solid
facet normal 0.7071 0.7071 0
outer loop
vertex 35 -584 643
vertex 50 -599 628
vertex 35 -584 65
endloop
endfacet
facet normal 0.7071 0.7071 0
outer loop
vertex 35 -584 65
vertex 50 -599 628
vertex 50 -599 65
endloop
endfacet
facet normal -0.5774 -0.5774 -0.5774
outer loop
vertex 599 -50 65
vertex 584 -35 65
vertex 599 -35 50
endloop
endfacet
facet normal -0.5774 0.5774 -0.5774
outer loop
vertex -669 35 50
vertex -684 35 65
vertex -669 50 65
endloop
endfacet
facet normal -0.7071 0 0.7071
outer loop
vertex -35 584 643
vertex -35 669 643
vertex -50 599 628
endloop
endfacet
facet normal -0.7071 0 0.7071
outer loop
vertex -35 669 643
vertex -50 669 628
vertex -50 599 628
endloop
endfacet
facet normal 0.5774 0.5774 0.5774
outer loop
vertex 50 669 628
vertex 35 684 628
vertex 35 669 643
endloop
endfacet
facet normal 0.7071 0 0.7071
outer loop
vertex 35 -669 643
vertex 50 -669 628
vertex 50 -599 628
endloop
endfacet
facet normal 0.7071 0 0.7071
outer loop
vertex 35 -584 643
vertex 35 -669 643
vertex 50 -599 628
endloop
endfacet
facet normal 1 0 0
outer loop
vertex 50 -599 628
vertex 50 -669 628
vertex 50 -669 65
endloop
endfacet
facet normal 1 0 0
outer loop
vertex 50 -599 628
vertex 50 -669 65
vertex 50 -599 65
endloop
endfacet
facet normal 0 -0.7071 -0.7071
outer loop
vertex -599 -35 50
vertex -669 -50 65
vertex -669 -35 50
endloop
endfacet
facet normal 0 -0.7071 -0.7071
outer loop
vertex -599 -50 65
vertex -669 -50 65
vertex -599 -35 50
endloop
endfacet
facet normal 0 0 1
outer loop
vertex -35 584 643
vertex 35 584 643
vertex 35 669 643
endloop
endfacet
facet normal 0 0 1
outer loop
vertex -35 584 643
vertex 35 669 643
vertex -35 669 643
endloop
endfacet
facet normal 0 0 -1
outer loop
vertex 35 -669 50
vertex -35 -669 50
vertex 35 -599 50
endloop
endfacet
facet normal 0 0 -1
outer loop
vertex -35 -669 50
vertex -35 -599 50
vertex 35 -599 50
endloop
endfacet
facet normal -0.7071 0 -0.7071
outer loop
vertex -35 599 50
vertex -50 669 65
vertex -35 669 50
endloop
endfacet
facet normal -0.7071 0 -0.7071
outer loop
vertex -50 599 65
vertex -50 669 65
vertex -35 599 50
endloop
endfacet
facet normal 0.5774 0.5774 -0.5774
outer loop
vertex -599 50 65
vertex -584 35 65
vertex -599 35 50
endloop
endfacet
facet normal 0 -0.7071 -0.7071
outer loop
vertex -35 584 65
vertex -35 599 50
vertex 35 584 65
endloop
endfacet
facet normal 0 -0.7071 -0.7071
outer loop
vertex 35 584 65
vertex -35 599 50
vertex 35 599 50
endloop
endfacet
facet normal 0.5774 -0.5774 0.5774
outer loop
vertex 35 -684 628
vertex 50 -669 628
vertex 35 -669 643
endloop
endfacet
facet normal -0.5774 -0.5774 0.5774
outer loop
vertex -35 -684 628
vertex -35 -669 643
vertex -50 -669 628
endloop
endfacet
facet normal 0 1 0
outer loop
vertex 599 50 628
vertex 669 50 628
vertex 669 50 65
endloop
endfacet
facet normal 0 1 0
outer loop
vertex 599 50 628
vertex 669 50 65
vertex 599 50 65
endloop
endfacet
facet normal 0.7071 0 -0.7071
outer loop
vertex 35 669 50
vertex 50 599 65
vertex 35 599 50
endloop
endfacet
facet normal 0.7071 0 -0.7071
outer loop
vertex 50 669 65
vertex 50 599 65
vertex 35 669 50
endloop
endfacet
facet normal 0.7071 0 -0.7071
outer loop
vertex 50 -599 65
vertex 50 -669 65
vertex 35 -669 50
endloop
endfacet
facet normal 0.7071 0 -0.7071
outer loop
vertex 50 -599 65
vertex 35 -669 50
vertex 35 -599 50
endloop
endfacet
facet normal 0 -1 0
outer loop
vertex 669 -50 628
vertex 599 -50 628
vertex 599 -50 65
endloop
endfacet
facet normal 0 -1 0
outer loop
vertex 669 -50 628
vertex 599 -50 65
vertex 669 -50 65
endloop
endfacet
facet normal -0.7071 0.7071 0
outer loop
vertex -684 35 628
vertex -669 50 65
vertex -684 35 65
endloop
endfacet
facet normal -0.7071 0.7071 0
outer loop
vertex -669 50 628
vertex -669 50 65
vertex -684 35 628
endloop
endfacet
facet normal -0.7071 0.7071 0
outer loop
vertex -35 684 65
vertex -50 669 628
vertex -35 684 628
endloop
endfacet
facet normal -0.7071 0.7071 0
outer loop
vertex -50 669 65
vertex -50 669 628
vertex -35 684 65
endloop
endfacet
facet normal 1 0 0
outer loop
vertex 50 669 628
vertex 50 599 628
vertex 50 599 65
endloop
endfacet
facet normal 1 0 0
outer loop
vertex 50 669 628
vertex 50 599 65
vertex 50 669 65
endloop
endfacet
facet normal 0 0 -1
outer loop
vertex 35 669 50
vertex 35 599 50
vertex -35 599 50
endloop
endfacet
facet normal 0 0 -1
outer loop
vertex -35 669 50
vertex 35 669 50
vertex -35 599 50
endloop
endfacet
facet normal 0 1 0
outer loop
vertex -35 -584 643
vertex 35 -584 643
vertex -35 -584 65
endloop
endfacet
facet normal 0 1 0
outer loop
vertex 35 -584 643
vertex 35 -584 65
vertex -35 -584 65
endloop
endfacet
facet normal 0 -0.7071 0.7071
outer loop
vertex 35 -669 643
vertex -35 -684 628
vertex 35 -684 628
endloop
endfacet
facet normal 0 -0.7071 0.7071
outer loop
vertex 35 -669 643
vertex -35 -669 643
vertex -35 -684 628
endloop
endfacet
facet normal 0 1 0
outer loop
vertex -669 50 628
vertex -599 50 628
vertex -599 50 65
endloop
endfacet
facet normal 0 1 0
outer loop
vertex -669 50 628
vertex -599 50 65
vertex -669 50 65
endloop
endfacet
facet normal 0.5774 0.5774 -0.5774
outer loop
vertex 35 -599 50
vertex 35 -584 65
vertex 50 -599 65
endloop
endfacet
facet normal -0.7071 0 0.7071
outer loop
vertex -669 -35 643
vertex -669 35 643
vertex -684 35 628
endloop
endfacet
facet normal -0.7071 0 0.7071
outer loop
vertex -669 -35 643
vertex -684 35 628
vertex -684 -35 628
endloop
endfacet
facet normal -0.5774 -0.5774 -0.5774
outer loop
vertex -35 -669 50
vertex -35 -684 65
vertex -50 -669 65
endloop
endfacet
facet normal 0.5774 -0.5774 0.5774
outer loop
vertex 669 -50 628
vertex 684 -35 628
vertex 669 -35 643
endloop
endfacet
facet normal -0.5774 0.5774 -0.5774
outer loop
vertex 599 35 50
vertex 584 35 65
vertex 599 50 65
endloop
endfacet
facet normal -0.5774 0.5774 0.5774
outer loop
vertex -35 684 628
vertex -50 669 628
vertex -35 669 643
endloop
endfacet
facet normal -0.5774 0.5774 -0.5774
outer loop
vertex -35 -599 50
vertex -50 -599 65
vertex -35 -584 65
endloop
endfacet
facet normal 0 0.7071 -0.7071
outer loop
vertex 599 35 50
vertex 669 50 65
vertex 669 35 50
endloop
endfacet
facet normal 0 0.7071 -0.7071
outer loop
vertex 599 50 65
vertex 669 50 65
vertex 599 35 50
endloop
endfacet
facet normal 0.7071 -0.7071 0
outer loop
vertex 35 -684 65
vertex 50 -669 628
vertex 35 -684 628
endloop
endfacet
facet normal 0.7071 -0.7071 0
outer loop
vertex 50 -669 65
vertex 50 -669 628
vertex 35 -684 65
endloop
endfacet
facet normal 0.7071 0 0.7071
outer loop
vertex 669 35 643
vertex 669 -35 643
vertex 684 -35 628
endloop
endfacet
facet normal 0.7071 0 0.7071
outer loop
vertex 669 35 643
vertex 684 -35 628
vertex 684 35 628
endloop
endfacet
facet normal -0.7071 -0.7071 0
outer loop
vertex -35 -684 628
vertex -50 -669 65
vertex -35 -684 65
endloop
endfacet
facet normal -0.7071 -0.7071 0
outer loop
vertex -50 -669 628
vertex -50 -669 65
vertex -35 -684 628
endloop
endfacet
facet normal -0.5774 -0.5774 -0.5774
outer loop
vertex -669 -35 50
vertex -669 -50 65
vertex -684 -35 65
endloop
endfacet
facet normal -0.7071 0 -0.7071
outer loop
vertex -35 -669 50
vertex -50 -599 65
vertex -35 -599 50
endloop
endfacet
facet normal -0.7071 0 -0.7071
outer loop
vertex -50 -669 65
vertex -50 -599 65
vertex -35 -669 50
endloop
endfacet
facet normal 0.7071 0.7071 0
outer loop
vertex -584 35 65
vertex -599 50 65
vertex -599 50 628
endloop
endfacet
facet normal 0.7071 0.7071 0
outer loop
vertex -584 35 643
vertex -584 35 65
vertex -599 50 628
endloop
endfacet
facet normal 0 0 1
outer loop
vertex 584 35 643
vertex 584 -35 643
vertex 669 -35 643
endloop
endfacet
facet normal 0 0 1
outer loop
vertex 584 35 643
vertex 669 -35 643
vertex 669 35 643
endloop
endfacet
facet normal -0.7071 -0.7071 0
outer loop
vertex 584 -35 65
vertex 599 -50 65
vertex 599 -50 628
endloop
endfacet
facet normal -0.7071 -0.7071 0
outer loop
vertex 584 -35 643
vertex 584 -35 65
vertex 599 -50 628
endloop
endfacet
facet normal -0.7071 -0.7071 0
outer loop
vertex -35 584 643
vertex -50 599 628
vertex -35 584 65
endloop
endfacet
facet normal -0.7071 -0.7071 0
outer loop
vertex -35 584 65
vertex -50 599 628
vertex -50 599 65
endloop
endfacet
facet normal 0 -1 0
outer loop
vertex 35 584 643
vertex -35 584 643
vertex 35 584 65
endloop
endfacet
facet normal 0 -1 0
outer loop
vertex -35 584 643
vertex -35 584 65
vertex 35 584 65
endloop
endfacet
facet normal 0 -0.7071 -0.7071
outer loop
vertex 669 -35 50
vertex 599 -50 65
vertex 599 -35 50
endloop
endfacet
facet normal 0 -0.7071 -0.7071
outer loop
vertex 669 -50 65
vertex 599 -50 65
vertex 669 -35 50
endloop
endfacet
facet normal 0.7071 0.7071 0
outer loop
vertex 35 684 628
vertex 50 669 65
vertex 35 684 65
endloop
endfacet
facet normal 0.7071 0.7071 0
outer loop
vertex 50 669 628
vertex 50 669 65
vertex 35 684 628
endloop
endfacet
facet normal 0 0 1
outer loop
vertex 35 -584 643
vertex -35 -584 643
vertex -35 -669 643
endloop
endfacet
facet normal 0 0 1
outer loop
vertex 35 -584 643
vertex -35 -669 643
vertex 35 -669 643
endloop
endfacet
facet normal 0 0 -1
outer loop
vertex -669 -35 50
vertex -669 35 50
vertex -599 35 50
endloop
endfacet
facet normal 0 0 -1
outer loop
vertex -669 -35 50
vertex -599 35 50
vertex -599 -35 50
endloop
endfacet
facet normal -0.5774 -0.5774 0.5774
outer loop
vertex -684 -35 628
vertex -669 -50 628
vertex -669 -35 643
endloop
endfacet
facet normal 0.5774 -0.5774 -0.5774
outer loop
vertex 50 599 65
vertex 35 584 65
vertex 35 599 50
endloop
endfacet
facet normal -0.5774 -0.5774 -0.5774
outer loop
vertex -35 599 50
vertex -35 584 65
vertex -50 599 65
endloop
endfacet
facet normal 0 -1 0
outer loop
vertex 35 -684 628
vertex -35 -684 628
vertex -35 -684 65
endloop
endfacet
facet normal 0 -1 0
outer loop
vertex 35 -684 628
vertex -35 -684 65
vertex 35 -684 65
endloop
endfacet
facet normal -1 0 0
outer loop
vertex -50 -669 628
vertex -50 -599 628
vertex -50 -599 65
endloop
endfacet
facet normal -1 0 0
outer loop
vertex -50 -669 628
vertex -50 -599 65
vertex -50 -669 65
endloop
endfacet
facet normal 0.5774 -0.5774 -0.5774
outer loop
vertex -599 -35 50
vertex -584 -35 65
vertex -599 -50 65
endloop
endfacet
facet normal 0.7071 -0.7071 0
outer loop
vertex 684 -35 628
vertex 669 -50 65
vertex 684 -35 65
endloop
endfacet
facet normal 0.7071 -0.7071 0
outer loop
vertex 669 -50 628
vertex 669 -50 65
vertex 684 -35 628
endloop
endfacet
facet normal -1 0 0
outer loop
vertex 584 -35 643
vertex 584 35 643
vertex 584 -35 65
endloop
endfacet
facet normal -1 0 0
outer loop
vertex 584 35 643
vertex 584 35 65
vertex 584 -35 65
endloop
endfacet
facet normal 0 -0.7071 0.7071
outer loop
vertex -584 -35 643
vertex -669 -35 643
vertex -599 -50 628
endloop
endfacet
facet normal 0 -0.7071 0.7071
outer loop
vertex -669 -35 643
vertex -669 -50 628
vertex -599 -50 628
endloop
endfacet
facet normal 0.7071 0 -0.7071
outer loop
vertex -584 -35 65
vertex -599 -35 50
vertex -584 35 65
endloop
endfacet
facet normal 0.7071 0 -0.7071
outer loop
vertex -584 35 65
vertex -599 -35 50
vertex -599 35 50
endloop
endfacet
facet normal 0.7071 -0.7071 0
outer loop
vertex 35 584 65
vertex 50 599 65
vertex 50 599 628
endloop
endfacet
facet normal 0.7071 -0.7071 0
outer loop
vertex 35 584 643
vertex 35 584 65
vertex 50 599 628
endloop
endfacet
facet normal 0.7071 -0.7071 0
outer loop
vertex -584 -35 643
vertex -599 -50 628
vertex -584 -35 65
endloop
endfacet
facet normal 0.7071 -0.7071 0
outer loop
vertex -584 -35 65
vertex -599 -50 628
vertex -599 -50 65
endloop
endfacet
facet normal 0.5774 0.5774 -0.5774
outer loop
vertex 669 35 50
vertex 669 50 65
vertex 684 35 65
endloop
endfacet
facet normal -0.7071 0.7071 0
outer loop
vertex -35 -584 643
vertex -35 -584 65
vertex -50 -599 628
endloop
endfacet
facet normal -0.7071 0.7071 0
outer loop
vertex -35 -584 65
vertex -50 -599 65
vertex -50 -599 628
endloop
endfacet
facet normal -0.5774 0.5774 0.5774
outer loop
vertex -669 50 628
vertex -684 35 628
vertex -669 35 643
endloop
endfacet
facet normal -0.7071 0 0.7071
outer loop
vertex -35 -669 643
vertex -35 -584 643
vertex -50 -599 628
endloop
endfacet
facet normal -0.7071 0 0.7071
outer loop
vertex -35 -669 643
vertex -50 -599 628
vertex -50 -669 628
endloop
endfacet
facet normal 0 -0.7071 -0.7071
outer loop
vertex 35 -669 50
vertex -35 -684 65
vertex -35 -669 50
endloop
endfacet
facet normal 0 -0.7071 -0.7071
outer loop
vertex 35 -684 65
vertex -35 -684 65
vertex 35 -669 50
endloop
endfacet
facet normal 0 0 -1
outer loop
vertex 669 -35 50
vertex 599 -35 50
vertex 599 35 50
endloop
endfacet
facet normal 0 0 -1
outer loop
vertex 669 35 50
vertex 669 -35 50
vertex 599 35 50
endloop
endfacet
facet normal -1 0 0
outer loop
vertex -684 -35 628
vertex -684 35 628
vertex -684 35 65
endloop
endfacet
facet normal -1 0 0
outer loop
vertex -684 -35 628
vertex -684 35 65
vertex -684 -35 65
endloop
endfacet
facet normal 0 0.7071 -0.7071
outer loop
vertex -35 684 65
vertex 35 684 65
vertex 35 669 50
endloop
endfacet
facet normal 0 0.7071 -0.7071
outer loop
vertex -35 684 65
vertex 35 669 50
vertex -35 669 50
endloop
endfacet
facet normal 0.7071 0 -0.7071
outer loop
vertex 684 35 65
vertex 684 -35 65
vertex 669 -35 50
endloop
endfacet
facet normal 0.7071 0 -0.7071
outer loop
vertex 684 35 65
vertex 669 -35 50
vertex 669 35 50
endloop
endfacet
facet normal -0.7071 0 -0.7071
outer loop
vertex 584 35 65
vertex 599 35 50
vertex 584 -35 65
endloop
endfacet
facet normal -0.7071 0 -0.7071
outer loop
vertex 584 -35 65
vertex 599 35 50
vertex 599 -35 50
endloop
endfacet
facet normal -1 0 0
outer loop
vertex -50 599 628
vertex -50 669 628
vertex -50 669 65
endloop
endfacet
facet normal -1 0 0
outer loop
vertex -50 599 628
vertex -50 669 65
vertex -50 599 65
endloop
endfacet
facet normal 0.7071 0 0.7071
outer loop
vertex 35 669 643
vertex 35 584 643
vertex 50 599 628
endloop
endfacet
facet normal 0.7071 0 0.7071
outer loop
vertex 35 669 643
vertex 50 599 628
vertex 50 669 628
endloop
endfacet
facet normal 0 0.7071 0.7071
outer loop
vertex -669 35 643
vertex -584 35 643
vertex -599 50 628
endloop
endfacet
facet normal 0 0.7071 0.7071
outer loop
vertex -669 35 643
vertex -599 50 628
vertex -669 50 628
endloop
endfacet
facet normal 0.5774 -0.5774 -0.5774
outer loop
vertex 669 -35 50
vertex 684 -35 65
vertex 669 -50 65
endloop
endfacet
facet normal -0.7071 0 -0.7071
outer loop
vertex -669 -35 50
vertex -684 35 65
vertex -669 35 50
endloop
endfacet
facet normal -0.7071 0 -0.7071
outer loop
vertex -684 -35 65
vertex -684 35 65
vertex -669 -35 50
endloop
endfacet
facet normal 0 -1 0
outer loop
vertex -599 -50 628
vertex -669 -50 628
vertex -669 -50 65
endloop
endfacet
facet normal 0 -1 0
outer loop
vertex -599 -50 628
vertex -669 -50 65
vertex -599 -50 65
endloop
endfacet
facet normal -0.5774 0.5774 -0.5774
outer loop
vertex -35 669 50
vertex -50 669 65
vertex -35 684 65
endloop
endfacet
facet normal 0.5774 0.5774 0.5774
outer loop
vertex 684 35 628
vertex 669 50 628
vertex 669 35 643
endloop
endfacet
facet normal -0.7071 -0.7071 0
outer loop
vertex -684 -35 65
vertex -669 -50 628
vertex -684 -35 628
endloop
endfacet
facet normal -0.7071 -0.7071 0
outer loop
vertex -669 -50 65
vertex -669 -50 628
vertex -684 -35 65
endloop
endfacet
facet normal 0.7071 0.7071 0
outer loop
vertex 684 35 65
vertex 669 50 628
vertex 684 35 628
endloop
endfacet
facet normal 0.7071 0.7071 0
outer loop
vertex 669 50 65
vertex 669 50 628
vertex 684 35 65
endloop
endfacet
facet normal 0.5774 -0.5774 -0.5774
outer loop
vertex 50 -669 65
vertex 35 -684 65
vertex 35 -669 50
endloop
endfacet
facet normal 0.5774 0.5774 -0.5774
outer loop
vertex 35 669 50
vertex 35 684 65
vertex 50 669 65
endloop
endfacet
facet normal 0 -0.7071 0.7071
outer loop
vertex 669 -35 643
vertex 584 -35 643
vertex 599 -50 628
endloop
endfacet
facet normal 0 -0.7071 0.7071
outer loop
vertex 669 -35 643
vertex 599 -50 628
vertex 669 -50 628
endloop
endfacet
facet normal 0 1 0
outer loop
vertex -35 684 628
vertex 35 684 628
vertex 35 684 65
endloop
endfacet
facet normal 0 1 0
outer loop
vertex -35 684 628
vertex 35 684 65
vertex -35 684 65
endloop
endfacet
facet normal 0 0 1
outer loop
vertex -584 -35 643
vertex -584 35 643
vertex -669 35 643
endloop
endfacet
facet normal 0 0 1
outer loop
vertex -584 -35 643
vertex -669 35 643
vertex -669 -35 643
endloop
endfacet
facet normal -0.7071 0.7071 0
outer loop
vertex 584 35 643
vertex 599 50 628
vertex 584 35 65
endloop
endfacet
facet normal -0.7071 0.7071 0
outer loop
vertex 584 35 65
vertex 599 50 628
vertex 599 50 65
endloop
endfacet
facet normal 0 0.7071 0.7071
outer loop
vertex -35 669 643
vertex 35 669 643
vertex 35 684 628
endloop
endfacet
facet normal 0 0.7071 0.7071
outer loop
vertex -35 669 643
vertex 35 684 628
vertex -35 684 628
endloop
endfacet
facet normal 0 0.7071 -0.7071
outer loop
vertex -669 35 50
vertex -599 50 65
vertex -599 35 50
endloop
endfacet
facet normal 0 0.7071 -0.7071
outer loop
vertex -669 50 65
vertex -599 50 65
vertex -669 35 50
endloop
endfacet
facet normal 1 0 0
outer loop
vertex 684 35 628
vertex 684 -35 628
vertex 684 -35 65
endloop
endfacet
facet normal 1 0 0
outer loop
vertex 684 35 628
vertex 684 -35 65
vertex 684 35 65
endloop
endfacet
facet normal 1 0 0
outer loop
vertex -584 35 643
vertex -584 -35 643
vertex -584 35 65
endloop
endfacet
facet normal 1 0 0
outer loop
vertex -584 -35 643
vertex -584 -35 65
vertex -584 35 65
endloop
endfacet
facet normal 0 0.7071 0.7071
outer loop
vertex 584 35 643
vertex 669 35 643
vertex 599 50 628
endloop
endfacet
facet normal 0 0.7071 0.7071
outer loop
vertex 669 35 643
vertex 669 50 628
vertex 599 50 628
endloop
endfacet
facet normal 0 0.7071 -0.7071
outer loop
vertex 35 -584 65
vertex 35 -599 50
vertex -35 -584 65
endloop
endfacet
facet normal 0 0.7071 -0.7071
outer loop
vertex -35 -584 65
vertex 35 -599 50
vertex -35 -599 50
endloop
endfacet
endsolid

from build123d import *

# Parameters (mm, degrees)
F4_DEPTH        = 500
F4_DEPTH_BACK   = 93
F4_COPIES_COUNT = 4
F5_SIZE         = 15
F5_2_SIZE       = 15
F5_3_SIZE       = 15
F5_4_SIZE       = 15


# Not quite as in the source:
# - a feature of the source that left no trace in its solid (it failed there, or was rolled back) is left out
# - a pattern or mirror of a feature is missing from the dataset's text; its kind, count and spacing are read off the source's solid
# - the program builds the solid bodies; features that only make, move or delete a surface that nothing else refers to are left out


with BuildPart() as f4:
    # F3 (on offset) → F4 (new body, two sides)
    with BuildSketch(Plane.XY.offset(550)) as f4_sk:
        with BuildLine():
            Line((50, -584), (-50, -584))
            Line((-50, -584), (-50, -632.0253159487))
            ThreePointArc((-50, -632.0253159487), (0, -634), (50, -632.0253159487))
            Line((50, -632.0253159487), (50, -584))
        make_face()
        with BuildLine():
            ThreePointArc((50, -632.0253159487), (0, -634), (-50, -632.0253159487))
            Line((-50, -632.0253159487), (-50, -684))
            Line((-50, -684), (50, -684))
            Line((50, -684), (50, -632.0253159487))
        make_face()
    extrude(amount=-F4_DEPTH)
    extrude(f4_sk.sketch, amount=F4_DEPTH_BACK)


with BuildPart() as f4_copies_1:
    # F4_copies: instance of F4
    add(f4.part.rotate(Axis((0, 0, 0), (0, 0, 1)), 1 * 360 / F4_COPIES_COUNT))

    # F5#2
    f5_2_edges = [f4_copies_1.edges().sort_by_distance(p)[0] for p in [
        (584, 0, 50),
        (584, -50, 346.5),
        (584, 50, 346.5),
        (634, 50, 50),
        (634, 50, 643),
        (684, 50, 346.5),
        (684, -50, 346.5),
        (684, 0, 50),
        (684, 0, 643),
        (634, -50, 643),
        (634, -50, 50),
    ]]
    chamfer(f5_2_edges, length=F5_2_SIZE)


with BuildPart() as f4_copies_2:
    # F4_copies: instance of F4
    add(f4.part.rotate(Axis((0, 0, 0), (0, 0, 1)), 2 * 360 / F4_COPIES_COUNT))

    # F5#3
    f5_3_edges = [f4_copies_2.edges().sort_by_distance(p)[0] for p in [
        (0, 584, 50),
        (50, 584, 346.5),
        (-50, 584, 346.5),
        (-50, 634, 50),
        (-50, 634, 643),
        (-50, 684, 346.5),
        (50, 684, 346.5),
        (0, 684, 50),
        (0, 684, 643),
        (50, 634, 643),
        (50, 634, 50),
    ]]
    chamfer(f5_3_edges, length=F5_3_SIZE)


with BuildPart() as f4_copies_3:
    # F4_copies: instance of F4
    add(f4.part.rotate(Axis((0, 0, 0), (0, 0, 1)), 3 * 360 / F4_COPIES_COUNT))

    # F5#4
    f5_4_edges = [f4_copies_3.edges().sort_by_distance(p)[0] for p in [
        (-584, 0, 50),
        (-584, 50, 346.5),
        (-584, -50, 346.5),
        (-634, -50, 50),
        (-634, -50, 643),
        (-684, -50, 346.5),
        (-684, 50, 346.5),
        (-684, 0, 50),
        (-684, 0, 643),
        (-634, 50, 643),
        (-634, 50, 50),
    ]]
    chamfer(f5_4_edges, length=F5_4_SIZE)


with BuildPart() as f4_1:
    add(f4.part)

    # F5
    f5_edges = [f4_1.edges().sort_by_distance(p)[0] for p in [
        (50, -684, 346.5),
        (50, -634, 643),
        (0, -684, 643),
        (-50, -634, 643),
        (50, -584, 346.5),
        (-50, -584, 346.5),
        (-50, -684, 346.5),
        (0, -684, 50),
        (-50, -634, 50),
        (0, -584, 50),
        (50, -634, 50),
    ]]
    chamfer(f5_edges, length=F5_SIZE)


solid = Compound([f4_copies_1.part, f4_copies_2.part, f4_copies_3.part, f4_1.part])
